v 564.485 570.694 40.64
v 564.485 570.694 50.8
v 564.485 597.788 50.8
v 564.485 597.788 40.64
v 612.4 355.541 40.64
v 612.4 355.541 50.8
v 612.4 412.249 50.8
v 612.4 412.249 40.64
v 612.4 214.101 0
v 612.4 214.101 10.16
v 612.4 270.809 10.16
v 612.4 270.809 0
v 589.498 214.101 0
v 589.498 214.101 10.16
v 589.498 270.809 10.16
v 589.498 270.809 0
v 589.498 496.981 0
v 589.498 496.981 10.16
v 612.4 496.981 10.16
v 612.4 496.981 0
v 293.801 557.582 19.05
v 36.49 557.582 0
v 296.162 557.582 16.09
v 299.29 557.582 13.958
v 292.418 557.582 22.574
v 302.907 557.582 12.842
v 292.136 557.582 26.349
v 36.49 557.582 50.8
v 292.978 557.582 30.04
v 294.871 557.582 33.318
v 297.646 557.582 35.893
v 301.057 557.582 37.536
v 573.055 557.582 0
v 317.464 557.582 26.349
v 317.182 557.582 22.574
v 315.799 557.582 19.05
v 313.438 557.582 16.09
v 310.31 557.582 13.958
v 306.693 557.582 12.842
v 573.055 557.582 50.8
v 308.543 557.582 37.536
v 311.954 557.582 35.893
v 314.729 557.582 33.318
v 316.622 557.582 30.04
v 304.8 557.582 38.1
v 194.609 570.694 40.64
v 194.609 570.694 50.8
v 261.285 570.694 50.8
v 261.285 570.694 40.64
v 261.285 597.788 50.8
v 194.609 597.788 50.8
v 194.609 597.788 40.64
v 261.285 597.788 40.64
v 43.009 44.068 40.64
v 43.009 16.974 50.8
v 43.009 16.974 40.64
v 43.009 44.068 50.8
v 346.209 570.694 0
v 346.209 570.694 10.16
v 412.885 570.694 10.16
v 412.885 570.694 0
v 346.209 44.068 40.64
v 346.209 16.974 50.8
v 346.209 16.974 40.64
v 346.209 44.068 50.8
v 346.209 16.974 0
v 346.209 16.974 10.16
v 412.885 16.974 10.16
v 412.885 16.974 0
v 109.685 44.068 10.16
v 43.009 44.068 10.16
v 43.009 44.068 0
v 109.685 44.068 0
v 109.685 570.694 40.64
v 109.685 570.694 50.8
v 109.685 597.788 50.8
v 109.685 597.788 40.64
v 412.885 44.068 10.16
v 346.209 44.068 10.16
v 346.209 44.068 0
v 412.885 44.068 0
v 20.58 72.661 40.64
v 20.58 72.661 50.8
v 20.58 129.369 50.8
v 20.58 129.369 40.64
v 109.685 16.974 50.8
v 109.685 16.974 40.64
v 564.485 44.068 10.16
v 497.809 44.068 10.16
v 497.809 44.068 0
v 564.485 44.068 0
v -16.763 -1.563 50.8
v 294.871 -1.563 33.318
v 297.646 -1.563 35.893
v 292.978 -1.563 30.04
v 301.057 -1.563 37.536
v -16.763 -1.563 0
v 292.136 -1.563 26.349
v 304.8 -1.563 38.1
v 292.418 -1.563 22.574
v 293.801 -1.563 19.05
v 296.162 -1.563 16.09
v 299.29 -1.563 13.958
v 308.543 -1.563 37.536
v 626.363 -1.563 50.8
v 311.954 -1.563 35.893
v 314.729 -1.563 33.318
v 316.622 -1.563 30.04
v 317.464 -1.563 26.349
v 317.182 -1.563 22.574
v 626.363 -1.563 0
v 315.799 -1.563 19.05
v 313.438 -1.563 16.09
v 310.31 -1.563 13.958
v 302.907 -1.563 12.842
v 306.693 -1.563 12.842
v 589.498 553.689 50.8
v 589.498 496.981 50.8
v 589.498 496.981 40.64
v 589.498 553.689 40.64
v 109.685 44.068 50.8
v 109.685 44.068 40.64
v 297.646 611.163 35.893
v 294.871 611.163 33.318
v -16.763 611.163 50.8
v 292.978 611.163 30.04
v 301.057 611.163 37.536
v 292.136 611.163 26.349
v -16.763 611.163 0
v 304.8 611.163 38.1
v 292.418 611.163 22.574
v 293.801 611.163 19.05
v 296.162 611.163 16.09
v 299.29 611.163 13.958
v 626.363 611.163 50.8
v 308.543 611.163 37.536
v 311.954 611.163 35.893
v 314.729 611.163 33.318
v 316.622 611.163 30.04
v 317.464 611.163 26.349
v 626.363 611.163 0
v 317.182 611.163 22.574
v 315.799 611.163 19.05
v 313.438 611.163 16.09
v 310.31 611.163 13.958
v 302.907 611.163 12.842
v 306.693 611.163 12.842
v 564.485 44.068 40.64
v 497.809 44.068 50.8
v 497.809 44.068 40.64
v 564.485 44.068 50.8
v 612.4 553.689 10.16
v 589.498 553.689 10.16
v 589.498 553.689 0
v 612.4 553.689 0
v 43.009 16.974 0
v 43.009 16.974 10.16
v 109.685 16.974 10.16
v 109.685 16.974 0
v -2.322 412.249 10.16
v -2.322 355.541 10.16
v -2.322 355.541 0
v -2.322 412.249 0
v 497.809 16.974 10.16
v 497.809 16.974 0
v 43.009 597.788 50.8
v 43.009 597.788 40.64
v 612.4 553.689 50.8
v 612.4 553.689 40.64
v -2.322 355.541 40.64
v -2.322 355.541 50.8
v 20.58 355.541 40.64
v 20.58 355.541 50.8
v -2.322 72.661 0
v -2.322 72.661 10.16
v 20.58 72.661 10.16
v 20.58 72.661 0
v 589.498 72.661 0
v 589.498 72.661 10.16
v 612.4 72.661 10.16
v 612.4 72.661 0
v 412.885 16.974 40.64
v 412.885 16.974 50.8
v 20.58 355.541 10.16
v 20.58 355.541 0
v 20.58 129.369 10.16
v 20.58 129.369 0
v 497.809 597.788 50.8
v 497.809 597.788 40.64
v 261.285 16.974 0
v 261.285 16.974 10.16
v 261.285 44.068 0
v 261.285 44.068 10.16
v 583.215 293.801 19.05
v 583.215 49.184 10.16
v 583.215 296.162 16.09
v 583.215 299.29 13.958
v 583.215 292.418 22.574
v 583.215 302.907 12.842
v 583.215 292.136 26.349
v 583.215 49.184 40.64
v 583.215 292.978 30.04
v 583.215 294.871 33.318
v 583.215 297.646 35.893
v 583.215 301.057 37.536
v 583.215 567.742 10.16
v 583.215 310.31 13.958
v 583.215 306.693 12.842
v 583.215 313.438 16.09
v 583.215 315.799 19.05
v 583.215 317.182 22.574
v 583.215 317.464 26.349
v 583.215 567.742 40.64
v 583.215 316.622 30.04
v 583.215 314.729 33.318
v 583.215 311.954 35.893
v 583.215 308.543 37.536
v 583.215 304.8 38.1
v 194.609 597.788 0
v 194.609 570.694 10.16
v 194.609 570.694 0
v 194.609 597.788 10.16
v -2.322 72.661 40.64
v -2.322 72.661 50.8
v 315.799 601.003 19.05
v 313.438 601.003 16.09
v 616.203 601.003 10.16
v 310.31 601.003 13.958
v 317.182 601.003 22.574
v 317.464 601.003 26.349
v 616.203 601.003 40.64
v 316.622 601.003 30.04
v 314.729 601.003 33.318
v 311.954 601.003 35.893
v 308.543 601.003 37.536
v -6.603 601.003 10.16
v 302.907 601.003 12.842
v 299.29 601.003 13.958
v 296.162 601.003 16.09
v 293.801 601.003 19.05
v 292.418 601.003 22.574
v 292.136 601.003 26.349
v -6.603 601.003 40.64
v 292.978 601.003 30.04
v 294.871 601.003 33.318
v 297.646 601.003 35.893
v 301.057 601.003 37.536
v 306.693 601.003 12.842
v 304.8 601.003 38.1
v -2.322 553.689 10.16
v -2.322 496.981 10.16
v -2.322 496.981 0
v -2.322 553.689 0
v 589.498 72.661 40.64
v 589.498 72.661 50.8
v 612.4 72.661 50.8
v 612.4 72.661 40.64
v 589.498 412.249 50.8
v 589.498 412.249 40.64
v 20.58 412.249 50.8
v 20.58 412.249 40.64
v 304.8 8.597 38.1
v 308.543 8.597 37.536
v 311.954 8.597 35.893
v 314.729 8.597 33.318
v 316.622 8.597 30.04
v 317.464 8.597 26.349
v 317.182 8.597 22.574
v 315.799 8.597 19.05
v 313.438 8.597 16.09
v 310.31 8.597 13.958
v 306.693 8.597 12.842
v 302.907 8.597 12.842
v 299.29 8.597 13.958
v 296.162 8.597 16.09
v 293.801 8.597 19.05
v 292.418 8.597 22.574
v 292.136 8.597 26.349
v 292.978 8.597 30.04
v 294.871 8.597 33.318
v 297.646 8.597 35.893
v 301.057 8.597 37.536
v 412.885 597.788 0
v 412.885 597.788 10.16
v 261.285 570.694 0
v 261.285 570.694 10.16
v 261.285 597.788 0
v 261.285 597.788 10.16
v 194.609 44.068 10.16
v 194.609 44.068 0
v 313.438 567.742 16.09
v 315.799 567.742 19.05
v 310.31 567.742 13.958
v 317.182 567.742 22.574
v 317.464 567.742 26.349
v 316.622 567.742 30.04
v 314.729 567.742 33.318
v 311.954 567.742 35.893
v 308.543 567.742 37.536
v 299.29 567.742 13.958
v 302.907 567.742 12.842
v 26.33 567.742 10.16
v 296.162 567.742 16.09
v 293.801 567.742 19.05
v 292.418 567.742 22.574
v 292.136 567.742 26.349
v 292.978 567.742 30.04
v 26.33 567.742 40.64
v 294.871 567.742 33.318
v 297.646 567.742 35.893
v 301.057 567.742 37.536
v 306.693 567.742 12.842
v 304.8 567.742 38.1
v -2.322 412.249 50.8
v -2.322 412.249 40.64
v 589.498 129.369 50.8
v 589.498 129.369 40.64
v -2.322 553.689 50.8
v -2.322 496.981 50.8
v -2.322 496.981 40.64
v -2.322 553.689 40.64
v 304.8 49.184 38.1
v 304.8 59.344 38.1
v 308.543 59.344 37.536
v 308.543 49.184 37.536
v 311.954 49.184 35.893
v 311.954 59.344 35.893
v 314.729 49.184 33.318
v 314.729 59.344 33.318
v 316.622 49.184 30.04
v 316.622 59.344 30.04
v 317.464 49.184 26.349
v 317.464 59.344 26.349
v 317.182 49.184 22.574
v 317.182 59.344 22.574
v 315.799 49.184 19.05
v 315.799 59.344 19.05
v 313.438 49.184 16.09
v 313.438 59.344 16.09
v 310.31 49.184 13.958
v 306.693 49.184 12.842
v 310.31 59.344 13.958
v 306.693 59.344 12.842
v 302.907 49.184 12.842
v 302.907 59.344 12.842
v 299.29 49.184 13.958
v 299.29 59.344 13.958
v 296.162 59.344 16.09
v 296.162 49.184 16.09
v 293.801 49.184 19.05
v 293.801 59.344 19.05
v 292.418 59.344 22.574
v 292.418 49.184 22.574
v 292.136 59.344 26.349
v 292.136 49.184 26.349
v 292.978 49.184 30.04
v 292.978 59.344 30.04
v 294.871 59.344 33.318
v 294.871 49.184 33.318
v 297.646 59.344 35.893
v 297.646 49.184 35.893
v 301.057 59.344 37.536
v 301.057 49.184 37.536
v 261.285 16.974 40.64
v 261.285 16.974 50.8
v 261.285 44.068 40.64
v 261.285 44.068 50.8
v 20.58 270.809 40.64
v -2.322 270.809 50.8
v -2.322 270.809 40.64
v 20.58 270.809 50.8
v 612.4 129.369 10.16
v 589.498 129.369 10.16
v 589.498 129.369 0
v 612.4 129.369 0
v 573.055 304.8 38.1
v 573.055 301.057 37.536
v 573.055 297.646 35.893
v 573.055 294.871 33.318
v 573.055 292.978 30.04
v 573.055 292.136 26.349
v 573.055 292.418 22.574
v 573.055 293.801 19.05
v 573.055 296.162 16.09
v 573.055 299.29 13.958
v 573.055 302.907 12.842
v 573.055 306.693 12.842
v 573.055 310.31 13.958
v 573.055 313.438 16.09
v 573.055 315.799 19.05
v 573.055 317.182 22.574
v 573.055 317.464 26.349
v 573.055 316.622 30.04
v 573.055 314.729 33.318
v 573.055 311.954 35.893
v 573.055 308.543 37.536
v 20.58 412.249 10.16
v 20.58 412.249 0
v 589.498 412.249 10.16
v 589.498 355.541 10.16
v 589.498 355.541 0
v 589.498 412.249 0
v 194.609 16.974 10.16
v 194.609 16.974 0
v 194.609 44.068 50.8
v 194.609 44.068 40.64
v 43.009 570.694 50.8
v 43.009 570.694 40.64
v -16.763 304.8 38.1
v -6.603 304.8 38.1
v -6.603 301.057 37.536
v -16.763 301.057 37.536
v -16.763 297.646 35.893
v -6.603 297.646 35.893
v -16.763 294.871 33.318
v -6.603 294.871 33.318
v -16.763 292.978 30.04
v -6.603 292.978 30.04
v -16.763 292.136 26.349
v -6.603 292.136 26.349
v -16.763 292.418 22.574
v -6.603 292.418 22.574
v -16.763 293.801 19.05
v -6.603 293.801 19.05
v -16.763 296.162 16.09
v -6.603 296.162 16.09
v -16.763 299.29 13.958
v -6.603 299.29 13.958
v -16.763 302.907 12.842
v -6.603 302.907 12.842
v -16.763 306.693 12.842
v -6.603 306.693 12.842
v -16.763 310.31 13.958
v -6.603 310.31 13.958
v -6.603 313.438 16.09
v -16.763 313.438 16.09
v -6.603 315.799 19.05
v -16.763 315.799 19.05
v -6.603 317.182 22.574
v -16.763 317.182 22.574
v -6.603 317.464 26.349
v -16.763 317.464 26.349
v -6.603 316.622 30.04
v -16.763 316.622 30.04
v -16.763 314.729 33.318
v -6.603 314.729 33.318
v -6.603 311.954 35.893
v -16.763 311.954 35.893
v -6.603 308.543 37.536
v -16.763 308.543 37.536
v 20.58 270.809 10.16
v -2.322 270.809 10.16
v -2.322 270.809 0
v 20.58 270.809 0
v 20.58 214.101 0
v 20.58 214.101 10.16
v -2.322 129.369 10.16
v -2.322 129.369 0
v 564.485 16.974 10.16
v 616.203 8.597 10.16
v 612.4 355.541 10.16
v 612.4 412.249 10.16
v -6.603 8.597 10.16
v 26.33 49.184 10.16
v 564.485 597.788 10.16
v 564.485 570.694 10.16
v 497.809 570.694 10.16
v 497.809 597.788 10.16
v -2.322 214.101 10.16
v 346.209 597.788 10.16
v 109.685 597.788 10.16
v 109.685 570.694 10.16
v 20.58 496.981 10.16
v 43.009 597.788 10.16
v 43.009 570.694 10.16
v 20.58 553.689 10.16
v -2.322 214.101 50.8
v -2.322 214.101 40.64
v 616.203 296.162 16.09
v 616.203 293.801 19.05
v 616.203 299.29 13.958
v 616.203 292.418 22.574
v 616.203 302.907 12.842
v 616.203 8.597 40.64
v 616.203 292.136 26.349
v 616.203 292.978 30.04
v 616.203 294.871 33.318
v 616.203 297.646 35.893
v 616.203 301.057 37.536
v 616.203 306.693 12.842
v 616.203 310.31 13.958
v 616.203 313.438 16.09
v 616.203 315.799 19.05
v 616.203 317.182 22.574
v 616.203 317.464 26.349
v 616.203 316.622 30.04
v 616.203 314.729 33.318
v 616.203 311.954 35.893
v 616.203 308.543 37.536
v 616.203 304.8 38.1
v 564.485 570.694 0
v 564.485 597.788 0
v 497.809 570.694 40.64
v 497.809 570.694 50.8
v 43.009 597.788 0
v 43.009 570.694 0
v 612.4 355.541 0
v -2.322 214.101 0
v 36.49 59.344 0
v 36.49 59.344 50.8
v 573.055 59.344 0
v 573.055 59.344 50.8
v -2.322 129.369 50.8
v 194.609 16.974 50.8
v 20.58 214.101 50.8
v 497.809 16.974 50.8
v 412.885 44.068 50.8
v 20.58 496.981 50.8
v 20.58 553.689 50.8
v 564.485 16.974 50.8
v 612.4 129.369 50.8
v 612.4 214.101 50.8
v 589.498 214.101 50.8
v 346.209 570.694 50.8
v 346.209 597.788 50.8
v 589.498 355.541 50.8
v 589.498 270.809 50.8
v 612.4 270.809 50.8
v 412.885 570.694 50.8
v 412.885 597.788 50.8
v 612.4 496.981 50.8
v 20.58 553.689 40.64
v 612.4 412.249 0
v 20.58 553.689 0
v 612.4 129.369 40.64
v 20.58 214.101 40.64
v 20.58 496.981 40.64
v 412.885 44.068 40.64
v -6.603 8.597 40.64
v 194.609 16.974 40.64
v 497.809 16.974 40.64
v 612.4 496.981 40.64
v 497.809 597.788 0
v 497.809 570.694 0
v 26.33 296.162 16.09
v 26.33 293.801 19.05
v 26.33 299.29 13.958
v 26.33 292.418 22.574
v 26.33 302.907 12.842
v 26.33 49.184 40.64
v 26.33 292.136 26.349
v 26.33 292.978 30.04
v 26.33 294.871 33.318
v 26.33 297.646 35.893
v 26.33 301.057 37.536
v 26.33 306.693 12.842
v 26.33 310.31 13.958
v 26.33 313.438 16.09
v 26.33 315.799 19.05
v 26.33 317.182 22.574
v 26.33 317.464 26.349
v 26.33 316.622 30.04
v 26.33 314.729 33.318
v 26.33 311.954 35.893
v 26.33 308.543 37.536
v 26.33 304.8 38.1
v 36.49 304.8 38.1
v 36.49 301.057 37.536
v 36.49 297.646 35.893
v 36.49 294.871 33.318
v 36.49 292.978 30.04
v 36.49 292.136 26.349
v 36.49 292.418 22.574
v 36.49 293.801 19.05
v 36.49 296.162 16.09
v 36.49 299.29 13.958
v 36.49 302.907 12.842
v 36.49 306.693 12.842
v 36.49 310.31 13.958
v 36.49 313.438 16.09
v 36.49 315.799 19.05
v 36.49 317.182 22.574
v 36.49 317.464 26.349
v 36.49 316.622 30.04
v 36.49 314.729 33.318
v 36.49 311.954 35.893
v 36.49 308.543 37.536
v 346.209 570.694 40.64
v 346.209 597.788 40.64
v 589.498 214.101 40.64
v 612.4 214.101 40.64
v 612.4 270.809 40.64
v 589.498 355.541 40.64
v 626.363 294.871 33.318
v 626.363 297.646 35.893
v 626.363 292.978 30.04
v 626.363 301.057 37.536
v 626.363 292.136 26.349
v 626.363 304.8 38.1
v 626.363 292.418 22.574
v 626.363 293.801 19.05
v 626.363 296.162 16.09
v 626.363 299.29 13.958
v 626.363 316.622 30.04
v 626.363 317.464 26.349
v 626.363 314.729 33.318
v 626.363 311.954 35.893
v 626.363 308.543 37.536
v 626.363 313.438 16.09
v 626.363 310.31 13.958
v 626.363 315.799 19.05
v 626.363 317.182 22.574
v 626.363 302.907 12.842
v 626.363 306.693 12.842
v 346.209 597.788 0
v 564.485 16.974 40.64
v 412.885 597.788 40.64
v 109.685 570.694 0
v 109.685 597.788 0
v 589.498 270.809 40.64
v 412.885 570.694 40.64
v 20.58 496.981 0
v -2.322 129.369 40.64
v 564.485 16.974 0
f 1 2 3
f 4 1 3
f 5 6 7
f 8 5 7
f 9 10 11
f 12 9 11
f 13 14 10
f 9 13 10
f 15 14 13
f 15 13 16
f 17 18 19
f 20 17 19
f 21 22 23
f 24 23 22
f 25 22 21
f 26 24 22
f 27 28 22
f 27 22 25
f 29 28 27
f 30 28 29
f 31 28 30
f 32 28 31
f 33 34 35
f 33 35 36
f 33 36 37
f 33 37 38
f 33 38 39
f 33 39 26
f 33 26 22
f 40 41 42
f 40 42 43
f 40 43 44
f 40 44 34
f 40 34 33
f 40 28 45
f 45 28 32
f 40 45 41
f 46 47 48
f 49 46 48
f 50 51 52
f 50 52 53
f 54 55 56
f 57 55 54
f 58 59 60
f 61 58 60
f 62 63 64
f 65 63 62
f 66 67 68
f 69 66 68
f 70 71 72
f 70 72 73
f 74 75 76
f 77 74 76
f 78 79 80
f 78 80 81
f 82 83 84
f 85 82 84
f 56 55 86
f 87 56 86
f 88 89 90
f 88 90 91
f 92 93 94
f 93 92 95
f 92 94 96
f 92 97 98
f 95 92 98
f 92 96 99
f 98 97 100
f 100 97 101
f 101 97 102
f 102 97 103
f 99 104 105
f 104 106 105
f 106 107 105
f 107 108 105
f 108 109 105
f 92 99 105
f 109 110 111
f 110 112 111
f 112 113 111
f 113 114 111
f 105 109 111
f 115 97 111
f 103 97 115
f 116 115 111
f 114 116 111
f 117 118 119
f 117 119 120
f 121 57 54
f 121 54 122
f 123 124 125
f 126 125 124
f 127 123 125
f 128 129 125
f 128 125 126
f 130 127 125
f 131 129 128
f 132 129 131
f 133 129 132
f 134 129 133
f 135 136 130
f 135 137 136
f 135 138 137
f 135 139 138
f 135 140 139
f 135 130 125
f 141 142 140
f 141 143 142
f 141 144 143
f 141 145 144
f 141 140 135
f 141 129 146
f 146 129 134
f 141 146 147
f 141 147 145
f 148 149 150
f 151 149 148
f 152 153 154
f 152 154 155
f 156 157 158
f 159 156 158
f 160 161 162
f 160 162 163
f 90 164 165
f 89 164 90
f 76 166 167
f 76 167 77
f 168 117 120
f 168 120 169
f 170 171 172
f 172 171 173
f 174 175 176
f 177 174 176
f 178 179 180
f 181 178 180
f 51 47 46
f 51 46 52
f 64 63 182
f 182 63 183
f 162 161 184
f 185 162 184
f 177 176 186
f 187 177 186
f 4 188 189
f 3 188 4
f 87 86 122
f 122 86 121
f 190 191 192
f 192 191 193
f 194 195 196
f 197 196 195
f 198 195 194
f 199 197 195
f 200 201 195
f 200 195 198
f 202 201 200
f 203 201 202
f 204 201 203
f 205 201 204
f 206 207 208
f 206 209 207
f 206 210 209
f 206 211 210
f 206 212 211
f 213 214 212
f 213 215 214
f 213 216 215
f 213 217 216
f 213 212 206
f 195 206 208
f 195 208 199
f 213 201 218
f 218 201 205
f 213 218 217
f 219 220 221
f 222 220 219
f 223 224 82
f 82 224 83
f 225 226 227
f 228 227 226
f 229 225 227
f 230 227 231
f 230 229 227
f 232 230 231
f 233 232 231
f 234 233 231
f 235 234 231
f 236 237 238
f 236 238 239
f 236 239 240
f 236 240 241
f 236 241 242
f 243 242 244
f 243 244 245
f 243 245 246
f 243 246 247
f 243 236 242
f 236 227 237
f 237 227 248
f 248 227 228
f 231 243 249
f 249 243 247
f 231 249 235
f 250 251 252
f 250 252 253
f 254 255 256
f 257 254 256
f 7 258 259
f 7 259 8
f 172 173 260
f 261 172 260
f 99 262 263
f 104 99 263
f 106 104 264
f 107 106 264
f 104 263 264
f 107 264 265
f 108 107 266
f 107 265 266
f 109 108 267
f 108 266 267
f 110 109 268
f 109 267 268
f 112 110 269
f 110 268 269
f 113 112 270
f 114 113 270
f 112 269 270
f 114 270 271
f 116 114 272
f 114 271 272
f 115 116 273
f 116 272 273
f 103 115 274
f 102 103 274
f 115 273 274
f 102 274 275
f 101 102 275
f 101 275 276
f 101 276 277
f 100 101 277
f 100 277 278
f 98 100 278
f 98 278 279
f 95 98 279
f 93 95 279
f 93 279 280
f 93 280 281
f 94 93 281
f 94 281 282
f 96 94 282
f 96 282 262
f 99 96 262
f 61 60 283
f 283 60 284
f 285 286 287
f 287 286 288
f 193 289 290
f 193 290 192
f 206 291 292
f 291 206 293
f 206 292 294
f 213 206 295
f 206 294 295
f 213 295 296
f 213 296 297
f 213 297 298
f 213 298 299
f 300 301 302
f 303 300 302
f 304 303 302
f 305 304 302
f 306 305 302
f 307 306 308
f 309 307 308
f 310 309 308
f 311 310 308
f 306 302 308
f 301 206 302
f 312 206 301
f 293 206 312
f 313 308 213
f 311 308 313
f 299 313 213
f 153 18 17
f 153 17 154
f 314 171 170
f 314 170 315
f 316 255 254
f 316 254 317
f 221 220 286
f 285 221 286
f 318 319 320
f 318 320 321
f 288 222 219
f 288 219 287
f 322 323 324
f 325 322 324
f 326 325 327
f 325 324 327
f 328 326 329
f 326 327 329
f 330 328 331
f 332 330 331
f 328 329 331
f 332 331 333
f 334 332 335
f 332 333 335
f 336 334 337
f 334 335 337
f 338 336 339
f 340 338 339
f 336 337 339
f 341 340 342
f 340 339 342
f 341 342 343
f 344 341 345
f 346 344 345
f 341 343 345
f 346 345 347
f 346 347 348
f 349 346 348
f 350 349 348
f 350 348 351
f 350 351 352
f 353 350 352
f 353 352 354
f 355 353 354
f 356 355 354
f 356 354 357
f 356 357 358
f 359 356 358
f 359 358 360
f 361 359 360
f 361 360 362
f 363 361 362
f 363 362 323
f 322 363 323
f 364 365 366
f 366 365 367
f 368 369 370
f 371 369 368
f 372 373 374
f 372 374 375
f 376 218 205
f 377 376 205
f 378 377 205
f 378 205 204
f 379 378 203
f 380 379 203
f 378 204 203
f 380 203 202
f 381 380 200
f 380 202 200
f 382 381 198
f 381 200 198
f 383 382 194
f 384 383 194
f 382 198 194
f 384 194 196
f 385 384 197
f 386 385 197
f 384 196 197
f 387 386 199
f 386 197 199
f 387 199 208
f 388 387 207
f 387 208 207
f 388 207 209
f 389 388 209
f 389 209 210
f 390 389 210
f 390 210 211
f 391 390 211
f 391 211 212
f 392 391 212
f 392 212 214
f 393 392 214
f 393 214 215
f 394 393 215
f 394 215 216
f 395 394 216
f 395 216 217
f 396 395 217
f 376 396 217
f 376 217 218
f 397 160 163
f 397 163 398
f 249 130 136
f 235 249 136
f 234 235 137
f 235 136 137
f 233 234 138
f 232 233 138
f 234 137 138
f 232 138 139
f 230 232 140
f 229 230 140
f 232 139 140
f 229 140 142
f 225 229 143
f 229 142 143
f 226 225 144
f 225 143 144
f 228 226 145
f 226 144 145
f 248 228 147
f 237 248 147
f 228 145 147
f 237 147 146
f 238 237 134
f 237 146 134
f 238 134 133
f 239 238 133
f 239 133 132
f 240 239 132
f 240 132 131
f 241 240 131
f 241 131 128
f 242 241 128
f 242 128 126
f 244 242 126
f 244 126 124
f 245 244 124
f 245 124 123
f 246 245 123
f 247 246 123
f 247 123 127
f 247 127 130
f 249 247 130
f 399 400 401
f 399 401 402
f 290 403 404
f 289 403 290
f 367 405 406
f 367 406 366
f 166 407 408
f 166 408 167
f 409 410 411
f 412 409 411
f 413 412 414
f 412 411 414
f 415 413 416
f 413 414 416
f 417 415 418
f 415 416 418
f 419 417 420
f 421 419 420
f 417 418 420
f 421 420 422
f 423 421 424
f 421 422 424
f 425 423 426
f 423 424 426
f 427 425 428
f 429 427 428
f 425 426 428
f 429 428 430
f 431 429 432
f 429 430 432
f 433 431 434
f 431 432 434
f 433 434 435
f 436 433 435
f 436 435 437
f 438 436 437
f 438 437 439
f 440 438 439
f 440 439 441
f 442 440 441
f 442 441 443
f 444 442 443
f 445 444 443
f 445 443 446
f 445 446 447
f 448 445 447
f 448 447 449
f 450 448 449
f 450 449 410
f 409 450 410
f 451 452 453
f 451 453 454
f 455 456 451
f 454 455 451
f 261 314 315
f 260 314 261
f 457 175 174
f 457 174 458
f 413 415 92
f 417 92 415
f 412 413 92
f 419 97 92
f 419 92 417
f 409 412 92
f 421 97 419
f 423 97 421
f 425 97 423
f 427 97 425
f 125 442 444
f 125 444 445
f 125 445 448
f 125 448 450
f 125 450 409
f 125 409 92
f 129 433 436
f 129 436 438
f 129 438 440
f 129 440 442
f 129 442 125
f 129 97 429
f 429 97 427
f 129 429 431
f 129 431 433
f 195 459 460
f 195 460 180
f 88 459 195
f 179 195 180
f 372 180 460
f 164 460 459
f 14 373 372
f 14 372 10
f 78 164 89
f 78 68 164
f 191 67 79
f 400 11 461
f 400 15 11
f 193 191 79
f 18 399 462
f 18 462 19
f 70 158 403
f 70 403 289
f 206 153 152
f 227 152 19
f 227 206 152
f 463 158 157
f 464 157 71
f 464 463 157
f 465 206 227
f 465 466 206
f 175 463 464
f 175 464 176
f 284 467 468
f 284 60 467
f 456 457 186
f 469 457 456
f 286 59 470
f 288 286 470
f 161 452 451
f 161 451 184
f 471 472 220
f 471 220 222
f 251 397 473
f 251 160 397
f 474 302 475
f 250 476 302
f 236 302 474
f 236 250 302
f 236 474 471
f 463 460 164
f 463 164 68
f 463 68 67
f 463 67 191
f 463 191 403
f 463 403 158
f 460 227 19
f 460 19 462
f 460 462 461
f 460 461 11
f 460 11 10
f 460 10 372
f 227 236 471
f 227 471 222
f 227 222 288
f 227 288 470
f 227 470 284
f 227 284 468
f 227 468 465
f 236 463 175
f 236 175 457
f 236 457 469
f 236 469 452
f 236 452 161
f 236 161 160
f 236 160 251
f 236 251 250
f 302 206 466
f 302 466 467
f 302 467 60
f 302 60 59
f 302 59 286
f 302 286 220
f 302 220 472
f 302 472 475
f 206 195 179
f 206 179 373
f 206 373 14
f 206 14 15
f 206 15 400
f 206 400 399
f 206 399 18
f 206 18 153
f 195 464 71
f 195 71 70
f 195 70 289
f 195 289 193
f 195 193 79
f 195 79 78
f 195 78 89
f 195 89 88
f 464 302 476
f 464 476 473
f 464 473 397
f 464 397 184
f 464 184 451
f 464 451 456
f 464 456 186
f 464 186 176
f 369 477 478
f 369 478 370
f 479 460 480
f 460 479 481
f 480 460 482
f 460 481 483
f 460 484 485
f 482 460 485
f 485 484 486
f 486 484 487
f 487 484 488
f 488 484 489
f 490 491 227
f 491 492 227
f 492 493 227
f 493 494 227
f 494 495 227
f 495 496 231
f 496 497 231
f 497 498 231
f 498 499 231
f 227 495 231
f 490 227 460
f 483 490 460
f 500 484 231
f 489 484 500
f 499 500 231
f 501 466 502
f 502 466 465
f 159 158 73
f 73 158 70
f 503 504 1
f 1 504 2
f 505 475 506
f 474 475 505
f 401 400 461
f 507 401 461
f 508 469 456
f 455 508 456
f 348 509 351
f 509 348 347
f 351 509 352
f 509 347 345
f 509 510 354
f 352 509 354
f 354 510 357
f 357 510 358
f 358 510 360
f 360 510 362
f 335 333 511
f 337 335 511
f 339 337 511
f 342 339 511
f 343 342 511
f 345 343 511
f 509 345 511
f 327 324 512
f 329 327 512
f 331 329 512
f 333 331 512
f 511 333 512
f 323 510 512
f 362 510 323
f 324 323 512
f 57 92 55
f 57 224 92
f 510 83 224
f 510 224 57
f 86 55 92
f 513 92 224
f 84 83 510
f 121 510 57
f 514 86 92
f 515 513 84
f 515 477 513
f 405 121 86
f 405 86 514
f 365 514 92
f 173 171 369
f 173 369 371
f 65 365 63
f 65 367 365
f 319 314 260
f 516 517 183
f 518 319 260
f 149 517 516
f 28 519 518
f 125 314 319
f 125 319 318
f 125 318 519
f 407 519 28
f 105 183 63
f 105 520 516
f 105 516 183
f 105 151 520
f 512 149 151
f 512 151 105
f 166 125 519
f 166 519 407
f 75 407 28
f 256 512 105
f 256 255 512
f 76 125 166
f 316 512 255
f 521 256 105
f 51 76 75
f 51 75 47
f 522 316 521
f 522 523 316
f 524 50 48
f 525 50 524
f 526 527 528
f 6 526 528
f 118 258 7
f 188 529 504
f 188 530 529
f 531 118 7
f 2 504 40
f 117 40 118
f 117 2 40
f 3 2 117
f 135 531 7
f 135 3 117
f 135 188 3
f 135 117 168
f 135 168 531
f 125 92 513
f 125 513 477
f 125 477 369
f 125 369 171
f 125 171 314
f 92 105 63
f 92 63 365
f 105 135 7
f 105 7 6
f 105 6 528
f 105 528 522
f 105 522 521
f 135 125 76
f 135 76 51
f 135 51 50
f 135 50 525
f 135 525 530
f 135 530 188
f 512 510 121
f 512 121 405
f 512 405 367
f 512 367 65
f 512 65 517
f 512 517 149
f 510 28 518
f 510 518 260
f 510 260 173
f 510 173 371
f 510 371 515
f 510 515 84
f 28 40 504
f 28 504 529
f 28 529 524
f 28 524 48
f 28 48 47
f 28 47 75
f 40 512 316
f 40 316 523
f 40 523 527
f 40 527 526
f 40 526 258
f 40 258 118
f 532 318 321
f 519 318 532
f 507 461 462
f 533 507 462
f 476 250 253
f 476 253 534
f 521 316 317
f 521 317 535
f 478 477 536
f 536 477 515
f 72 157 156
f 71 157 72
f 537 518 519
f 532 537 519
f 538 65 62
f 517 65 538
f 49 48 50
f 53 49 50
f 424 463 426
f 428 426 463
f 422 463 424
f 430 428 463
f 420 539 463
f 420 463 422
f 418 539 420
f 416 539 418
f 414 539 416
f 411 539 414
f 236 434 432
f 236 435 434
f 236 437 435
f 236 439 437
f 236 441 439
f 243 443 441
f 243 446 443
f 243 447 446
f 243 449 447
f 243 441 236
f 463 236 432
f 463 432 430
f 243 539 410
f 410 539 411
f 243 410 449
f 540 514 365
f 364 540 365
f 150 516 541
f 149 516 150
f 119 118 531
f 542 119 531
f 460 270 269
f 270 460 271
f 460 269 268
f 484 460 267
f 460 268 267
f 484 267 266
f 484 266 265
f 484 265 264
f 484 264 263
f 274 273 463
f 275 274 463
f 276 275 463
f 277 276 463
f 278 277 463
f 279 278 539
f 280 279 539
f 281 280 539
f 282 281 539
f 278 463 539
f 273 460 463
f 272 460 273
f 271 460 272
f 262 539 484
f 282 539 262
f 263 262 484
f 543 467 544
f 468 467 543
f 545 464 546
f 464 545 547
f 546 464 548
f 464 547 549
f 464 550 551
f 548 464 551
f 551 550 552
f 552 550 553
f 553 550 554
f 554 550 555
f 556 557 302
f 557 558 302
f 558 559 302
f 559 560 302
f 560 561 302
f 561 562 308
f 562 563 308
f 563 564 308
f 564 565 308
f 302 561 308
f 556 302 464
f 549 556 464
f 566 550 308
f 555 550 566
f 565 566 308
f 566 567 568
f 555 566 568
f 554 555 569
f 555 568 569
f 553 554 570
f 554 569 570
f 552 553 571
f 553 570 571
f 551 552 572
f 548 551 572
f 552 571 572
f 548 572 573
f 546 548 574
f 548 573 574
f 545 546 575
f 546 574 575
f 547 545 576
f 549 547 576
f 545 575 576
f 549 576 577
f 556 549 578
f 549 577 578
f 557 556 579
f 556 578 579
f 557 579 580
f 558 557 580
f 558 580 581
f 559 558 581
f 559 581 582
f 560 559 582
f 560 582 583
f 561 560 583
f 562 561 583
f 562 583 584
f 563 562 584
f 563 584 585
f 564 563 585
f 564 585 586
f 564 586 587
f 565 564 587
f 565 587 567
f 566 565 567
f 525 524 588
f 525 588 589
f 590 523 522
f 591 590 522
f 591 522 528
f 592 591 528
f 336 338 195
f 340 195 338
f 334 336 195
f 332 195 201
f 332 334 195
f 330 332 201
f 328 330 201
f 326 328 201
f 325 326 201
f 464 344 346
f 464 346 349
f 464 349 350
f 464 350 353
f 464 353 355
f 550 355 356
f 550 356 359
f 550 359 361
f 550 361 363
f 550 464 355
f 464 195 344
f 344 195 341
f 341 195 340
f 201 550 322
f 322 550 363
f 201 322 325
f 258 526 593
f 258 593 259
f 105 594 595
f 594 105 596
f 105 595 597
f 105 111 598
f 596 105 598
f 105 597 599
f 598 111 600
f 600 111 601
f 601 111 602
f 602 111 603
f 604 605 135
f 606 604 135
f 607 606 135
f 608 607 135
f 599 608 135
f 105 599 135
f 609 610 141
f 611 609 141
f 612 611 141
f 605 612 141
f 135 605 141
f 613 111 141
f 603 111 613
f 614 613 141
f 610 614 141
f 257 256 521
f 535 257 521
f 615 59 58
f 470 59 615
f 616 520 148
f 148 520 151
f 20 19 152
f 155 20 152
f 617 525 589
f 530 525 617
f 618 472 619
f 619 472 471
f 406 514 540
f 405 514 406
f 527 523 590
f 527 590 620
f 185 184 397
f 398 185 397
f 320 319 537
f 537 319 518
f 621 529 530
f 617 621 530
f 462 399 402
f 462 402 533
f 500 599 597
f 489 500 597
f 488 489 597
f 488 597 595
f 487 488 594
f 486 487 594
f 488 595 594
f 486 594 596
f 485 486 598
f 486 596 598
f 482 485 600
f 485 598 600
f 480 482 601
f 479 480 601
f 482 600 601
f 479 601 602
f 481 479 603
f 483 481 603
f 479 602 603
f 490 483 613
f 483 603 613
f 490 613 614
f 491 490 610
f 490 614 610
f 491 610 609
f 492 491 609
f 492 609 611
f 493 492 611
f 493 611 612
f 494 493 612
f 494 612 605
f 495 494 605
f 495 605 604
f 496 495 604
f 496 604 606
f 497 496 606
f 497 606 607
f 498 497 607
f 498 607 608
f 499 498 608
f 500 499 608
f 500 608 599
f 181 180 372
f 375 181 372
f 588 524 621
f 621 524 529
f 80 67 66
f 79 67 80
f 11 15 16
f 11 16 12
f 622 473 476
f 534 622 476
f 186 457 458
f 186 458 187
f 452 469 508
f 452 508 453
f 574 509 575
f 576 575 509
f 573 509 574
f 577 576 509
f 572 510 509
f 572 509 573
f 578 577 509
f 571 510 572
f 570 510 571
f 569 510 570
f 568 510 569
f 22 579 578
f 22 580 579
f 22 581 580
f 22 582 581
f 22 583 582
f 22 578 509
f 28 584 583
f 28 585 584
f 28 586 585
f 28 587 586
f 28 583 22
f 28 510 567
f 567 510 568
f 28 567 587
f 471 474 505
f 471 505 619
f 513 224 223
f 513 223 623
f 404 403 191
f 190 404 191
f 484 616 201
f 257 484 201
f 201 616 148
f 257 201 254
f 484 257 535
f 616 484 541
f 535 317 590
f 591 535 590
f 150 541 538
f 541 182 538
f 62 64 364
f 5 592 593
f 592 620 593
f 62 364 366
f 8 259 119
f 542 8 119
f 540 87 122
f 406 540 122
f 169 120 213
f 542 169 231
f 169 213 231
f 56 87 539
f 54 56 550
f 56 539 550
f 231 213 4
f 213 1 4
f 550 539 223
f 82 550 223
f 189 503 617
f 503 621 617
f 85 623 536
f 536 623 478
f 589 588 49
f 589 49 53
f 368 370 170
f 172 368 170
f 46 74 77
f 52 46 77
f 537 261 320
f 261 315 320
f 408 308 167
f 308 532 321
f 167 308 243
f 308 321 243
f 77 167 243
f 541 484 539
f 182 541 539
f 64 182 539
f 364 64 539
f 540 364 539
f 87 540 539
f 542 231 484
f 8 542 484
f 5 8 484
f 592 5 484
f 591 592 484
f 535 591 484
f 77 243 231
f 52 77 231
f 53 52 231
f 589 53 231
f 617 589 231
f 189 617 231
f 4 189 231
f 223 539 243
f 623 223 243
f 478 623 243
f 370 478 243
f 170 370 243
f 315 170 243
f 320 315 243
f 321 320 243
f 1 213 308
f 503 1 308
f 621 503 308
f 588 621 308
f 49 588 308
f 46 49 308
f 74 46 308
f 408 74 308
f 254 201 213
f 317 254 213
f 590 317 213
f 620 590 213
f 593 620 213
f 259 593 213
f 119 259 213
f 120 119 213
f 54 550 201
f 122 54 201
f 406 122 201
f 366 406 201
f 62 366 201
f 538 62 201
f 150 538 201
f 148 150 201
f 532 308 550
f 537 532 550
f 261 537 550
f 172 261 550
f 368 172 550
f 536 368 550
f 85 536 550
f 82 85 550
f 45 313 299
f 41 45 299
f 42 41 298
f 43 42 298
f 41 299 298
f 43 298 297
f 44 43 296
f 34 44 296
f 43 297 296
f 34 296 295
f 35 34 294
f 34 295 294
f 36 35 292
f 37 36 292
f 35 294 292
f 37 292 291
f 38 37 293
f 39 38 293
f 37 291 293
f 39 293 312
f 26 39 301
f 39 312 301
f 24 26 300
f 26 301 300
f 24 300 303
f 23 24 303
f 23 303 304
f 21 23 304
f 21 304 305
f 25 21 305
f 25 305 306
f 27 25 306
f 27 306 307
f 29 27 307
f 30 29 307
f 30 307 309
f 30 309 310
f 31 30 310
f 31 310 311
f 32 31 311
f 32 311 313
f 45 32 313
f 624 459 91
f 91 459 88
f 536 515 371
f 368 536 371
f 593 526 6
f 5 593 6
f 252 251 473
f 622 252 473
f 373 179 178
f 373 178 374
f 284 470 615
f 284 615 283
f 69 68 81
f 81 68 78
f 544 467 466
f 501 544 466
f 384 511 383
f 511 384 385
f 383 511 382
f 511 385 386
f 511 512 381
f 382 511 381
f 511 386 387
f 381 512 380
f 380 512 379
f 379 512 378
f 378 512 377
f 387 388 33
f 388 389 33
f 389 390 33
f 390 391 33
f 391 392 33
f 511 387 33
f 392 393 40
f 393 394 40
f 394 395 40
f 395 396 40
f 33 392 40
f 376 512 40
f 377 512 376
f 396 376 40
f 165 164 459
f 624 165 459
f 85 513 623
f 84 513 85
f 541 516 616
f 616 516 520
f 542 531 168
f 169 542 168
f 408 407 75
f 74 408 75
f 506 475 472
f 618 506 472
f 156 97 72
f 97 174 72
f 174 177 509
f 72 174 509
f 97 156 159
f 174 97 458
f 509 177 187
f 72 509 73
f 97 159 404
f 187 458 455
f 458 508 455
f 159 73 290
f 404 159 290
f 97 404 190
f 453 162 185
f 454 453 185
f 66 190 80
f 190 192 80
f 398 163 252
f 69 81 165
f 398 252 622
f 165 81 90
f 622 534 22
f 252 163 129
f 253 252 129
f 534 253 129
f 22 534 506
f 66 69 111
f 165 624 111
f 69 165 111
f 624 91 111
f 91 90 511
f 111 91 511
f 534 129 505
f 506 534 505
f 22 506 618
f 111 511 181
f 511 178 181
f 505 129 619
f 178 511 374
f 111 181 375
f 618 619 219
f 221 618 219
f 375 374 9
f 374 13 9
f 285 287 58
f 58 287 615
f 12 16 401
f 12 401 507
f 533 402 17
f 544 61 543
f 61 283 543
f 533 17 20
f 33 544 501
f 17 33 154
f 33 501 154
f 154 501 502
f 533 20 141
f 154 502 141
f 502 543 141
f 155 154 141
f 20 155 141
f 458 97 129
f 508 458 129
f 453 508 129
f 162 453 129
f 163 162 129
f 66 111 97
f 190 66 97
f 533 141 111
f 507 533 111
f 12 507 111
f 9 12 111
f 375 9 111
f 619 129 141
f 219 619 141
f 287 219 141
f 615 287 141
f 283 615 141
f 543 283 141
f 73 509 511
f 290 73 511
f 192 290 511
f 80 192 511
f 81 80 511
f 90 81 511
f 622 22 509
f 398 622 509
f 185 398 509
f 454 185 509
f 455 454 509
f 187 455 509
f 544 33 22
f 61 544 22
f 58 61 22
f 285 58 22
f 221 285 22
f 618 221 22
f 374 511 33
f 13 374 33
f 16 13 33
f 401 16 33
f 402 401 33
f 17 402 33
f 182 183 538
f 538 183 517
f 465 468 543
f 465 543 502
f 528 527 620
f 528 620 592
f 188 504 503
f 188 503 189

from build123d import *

# Parameters (mm, degrees)
SKETCH1_W            = 643.125455594
SKETCH1_H            = 612.725254334
BOSS_EXTRUDE1_DEPTH  = 50.8
SKETCH3_W            = 536.564550572
SKETCH3_H            = 498.238511246
CUT_EXTRUDE2_DEPTH   = 50.8
SHELL5_START         = -6.602727797
SHELL5_OUTLINE_W     = 40.586297515
SHELL5_OUTLINE_H     = 30.48
SHELL5_OUTLINE_W_2   = 33.260445573
SHELL5_DEPTH         = 622.805455594
SHELL5_START_2       = 583.214532361
SHELL5_2_OUTLINE_W   = 518.558511246
SHELL5_2_OUTLINE_H   = 30.48
SHELL5_2_DEPTH       = 32.988195436
SHELL5_3_OUTLINE_W   = 518.558511246
SHELL5_3_OUTLINE_H   = 30.48
SHELL5_3_DEPTH       = 32.932709586
SKETCH7_W            = 66.675404896
SKETCH7_H            = 27.093969604
CUT_EXTRUDE3_DEPTH   = 50.8
LPATTERN1_COUNT      = 4
LPATTERN1_PITCH      = 151.6
LPATTERN1_COUNT_DIR2 = 2
LPATTERN1_PITCH_DIR2 = 553.72
SKETCH8_W            = 22.902108828
SKETCH8_H            = 56.707978581
CUT_EXTRUDE4_DEPTH   = 50.8
LPATTERN2_COUNT      = 4
LPATTERN2_PITCH      = 141.44
LPATTERN2_COUNT_DIR2 = 2
LPATTERN2_PITCH_DIR2 = 591.82
SKETCH11_R           = 12.7
CUT_EXTRUDE5_DEPTH   = 635
SKETCH12_R           = 12.7
CUT_EXTRUDE7_DEPTH   = 660.4


# Read off the part's stored shape, not the designer's step: Shell5
with BuildPart() as part:
    # Sketch1 → Boss-Extrude1 (new body)
    with BuildSketch(Plane.XY):
        with Locations((304.8, 304.8)):
            Rectangle(SKETCH1_W, SKETCH1_H)
    extrude(amount=BOSS_EXTRUDE1_DEPTH)

    # Sketch3 → Cut-Extrude2 (cut)
    with BuildSketch(Plane.XY.offset(50.8)):
        with Locations((304.772257075, 308.462925971)):
            Rectangle(SKETCH3_W, SKETCH3_H)
    extrude(amount=-CUT_EXTRUDE2_DEPTH, mode=Mode.SUBTRACT)

    # Shell5 outline → Shell5 (cut)
    with BuildSketch(Plane.YZ.offset(SHELL5_START)):
        with Locations((28.890521591, 25.4)):
            Rectangle(SHELL5_OUTLINE_W, SHELL5_OUTLINE_H)
        with Locations((584.372404381, 25.4)):
            Rectangle(SHELL5_OUTLINE_W_2, SHELL5_OUTLINE_H)
    extrude(amount=SHELL5_DEPTH, mode=Mode.SUBTRACT)

    # Shell5 2 outline → Shell5 2 (cut)
    with BuildSketch(Plane.YZ.offset(SHELL5_START_2)):
        with Locations((308.462925971, 25.4)):
            Rectangle(SHELL5_2_OUTLINE_W, SHELL5_2_OUTLINE_H)
    extrude(amount=SHELL5_2_DEPTH, mode=Mode.SUBTRACT)

    # Shell5 3 outline → Shell5 3 (cut)
    with BuildSketch(Plane.YZ.offset(SHELL5_START)):
        with Locations((308.462925971, 25.4)):
            Rectangle(SHELL5_3_OUTLINE_W, SHELL5_3_OUTLINE_H)
    extrude(amount=SHELL5_3_DEPTH, mode=Mode.SUBTRACT)

    # Sketch7 → Cut-Extrude3 (cut)
    with BuildSketch(Plane.XY.offset(50.8)):
        with Locations((76.34692027, 584.240607078)):
            Rectangle(SKETCH7_W, SKETCH7_H)
    cut_extrude3 = extrude(amount=-CUT_EXTRUDE3_DEPTH, mode=Mode.SUBTRACT)

    # LPattern1: Cut-Extrude3 4 × 2
    with Locations(*[(i * LPATTERN1_PITCH, -j * LPATTERN1_PITCH_DIR2, 0) for i in range(LPATTERN1_COUNT) for j in range(LPATTERN1_COUNT_DIR2) if (i, j) != (0, 0)]):
        add(cut_extrude3, mode=Mode.SUBTRACT)

    # Sketch8 → Cut-Extrude4 (cut)
    with BuildSketch(Plane.XY.offset(50.8)):
        with Locations((9.129138523, 525.334860242)):
            Rectangle(SKETCH8_W, SKETCH8_H)
    cut_extrude4 = extrude(amount=-CUT_EXTRUDE4_DEPTH, mode=Mode.SUBTRACT)

    # LPattern2: Cut-Extrude4 4 × 2
    with Locations(*[(j * LPATTERN2_PITCH_DIR2, -i * LPATTERN2_PITCH, 0) for i in range(LPATTERN2_COUNT) for j in range(LPATTERN2_COUNT_DIR2) if (i, j) != (0, 0)]):
        add(cut_extrude4, mode=Mode.SUBTRACT)

    # Sketch11 → Cut-Extrude5 (cut)
    with BuildSketch(Plane(origin=(0, 611.162627167, 0), x_dir=(1, 0, 0), z_dir=(0, 1, 0))):
        with Locations(Location((304.8, -25.4, 0), (0, 0, 270))):
            Circle(SKETCH11_R)
    extrude(amount=-CUT_EXTRUDE5_DEPTH, mode=Mode.SUBTRACT)

    # Sketch12 → Cut-Extrude7 (cut)
    with BuildSketch(Plane(origin=(626.362727797, 0, 0), x_dir=(0, 0, -1), z_dir=(1, 0, 0))):
        with Locations(Location((-25.4, 304.8, 0), (0, 0, 180))):
            Circle(SKETCH12_R)
    extrude(amount=-CUT_EXTRUDE7_DEPTH, mode=Mode.SUBTRACT)


solid = part.part
